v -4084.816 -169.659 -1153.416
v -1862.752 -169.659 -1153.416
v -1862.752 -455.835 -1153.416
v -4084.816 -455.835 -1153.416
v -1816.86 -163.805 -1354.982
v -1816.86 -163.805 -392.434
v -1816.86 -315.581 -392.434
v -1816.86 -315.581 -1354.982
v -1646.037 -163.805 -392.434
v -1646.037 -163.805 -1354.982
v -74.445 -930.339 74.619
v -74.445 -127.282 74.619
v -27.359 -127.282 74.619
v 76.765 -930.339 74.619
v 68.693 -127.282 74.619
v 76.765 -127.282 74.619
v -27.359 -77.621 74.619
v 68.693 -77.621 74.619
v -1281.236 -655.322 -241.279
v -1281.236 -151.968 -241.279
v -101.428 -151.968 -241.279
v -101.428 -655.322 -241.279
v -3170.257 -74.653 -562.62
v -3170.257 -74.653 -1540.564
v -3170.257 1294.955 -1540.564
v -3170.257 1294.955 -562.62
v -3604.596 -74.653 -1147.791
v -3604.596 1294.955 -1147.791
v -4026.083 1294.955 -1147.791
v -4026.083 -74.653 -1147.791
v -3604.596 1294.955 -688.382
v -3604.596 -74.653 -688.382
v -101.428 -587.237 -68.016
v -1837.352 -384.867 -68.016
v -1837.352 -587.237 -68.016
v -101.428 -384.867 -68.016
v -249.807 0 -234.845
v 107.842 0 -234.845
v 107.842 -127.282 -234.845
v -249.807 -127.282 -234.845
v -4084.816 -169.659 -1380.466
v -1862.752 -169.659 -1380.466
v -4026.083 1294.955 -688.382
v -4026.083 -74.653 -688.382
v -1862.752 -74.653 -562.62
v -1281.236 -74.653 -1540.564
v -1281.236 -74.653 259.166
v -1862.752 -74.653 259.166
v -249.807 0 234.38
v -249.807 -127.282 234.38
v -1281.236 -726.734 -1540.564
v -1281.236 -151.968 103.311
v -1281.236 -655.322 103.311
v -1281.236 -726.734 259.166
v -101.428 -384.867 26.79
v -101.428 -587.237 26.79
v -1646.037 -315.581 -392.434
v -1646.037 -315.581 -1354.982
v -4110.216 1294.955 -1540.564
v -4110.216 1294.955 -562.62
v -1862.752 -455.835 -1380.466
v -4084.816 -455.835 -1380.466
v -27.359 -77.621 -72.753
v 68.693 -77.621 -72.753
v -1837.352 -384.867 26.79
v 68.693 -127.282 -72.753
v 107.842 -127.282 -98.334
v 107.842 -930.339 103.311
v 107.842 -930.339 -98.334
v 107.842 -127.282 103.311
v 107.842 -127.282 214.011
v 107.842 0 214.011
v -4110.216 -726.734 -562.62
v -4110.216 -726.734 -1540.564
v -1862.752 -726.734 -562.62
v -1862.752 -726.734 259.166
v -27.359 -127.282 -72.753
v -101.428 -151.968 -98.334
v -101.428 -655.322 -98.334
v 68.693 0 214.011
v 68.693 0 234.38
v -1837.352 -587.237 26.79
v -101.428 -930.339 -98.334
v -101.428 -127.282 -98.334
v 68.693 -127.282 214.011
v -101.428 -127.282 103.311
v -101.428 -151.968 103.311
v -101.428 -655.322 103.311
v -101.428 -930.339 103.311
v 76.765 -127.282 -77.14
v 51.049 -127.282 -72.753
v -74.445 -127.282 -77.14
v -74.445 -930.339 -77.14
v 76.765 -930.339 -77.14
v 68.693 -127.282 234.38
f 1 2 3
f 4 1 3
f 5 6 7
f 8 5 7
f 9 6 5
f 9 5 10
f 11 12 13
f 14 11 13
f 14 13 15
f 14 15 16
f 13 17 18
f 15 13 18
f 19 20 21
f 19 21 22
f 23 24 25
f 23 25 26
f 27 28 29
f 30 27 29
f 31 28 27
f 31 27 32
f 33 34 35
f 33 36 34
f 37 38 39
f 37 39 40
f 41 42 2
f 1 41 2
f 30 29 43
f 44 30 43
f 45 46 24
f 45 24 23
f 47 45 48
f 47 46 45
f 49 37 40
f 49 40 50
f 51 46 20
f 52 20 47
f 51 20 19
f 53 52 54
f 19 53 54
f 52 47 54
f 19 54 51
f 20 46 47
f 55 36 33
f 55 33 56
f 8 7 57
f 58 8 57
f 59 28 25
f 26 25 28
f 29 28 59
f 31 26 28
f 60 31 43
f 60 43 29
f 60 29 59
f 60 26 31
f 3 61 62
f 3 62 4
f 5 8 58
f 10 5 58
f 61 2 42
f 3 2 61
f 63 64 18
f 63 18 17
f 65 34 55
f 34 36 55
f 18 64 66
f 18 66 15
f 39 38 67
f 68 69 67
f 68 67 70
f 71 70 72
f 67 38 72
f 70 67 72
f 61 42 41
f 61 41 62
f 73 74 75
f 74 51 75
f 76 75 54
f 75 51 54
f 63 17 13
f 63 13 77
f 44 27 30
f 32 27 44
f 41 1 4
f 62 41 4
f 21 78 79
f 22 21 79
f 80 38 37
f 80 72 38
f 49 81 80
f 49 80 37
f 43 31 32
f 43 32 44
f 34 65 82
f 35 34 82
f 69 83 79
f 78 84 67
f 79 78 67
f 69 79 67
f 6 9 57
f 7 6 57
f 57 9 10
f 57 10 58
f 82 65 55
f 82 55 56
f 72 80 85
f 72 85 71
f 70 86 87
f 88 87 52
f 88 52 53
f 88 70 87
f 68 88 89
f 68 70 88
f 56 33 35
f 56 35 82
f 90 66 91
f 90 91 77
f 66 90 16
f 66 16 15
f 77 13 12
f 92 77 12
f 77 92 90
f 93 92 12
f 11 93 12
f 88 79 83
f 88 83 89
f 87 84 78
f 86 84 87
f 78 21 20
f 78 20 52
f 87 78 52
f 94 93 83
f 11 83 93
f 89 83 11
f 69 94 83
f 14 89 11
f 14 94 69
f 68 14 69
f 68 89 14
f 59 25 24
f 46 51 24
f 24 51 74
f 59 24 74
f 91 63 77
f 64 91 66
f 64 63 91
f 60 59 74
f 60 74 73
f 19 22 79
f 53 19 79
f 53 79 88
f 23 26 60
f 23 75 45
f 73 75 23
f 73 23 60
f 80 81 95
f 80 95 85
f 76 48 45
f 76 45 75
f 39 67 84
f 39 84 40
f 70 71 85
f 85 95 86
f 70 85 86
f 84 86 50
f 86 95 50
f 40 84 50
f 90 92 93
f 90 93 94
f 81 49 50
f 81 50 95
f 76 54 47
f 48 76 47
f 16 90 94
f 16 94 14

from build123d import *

# Parameters (mm, degrees)
F0_W      = 209.269605577
F0_H      = 201.645091176
F0_W_2    = 151.2103900313
F0_H_2    = 151.7591774464
F1_DEPTH  = 930.3391575813
F2_W      = 0.2076402307
F2_H      = 120.5585766584
F2_W_2    = 134.993257001
F2_H_2    = 81.0865145177
F3_DEPTH  = 77.6207819581
F4_W      = 17.644263804
F4_H      = 139.3913254142
F4_H_2    = 162.0914302766
F5_DEPTH  = 127.2815465927
F6_W      = 503.354460001
F6_H      = 344.5896953344
F6_W_2    = 202.3705542088
F6_H_2    = 94.8067847639
F7_DEPTH  = 1179.8084974289
F8_W      = 652.0807296038
F8_H      = 651.5993475914
F8_W_2    = 202.3705542088
F8_H_2    = 94.8067847639
F9_DEPTH  = 556.1156272888
F10_W     = 139.4962072372
F10_H     = 279.7787887976
F10_H_2   = 371.8205587938
F11_DEPTH = 25.4
F12_W     = 581.5156272888
F12_H     = 652.0807296038
F12_W_2   = 170.8229780197
F12_H_2   = 151.7756134272
F13_DEPTH = 962.5483155251
F14_W     = 581.5156272888
F14_H     = 652.0807296038
F15_DEPTH = 185.5821758509
F16_W     = 652.0807296038
F16_H     = 977.9443591833
F16_W_2   = 286.1760705709
F16_H_2   = 227.0501852036
F17_DEPTH = 2222.0644950867
F18_W     = 652.0807296038
F18_H     = 977.9443591833
F19_DEPTH = 25.4
F20_W     = 939.9594037414
F20_H     = 977.9443591833
F20_W_2   = 421.4870929718
F20_H_2   = 459.4081640244
F21_DEPTH = 1369.6082830429


with BuildPart() as f1:
    # F0 (on Front) → F1 (new body)
    with BuildSketch(Plane.XZ):
        with Locations((3.2069273293, 2.4884268641)):
            Rectangle(F0_W, F0_H)
        with Locations((1.1598430574, -1.2602582574)):
            Rectangle(F0_W_2, F0_H_2, mode=Mode.SUBTRACT)
    extrude(amount=F1_DEPTH)

    # F2 (on face) → F3 (join)
    with BuildSketch(Plane(origin=(0, 0, 0), x_dir=(-1, 0, 0), z_dir=(0, 1, 0))):
        with Locations((-107.7379100025, 43.031684123)):
            Rectangle(F2_W, F2_H)
        Polygon((-107.6340898871, 126.5658885241), (-107.6340898871, 103.3109724522), (27.3591671139, 103.3109724522), (101.4278754592, 103.3109724522), (101.4278754592, -98.3341187239), (27.3591671139, -98.3341187239), (-107.6340898871, -98.3341187239), (-107.6340898871, -121.4749068022), (121.2418451905, -121.4749068022), (121.2418451905, 126.5658885241), align=None)
        with Locations((-40.1374613866, 43.031684123)):
            Rectangle(F2_W_2, F2_H)
        with Locations((-107.7379100025, -57.790861465)):
            Rectangle(F2_W, F2_H_2)
        with Locations((-40.1374613866, -57.790861465)):
            Rectangle(F2_W_2, F2_H_2)
    extrude(amount=-F3_DEPTH)

    # F4 (on face) → F5 (join)
    with BuildSketch(Plane(origin=(0, 0, 0), x_dir=(-1, 0, 0), z_dir=(0, 1, 0))):
        Polygon((-51.0488376021, 74.6193304658), (27.3591671139, 74.6193304658), (27.3591671139, -72.753354907), (-51.0488376021, -72.753354907), (-51.0488376021, -234.8447851837), (249.8074322939, -234.8447851837), (249.8074322939, 234.3800067902), (-68.6931014061, 234.3800067902), (-68.6931014061, 214.01065588), (-51.0488376021, 214.01065588), align=None)
        with Locations((-59.8709695041, 144.3149931729)):
            Rectangle(F4_W, F4_H)
        Polygon((-68.6931014061, -72.753354907), (-68.6931014061, 74.6193304658), (-68.6931014061, 214.01065588), (-107.8417301178, 214.01065588), (-107.8417301178, -234.8447851837), (-68.6931014061, -234.8447851837), align=None)
        with Locations((-59.8709695041, -153.7990700454)):
            Rectangle(F4_W, F4_H_2)
    extrude(amount=-F5_DEPTH)

    # F6 (on face) → F7 (join)
    with BuildSketch(Plane(origin=(-101.4278754592, 0, 0), x_dir=(0, -1, 0), z_dir=(-1, 0, 0))):
        with Locations((403.644785285, -68.9838752151)):
            Rectangle(F6_W, F6_H)
        with Locations((486.0520809889, -20.6129951403)):
            Rectangle(F6_W_2, F6_H_2, mode=Mode.SUBTRACT)
    extrude(amount=F7_DEPTH)

    # F8 (on face) → F9 (join)
    with BuildSketch(Plane(origin=(-1281.2363728881, 0, 0), x_dir=(0, -1, 0), z_dir=(-1, 0, 0))):
        with Locations((400.6932005286, -66.6338801384)):
            Rectangle(F8_W, F8_H)
        with Locations((486.0520809889, -20.6129951403)):
            Rectangle(F8_W_2, F8_H_2, mode=Mode.SUBTRACT)
    extrude(amount=F9_DEPTH)

    # F10 (on face) → F11 (join)
    with BuildSketch(Plane(origin=(-1837.3520001769, 0, 0), x_dir=(0, -1, 0), z_dir=(-1, 0, 0))):
        with Locations((656.9854617119, 119.2763992585)):
            Rectangle(F10_W, F10_H)
        Polygon((587.2373580933, -392.4335539341), (587.2373580933, -20.6129951403), (587.2373580933, 259.1657936573), (74.6528357267, 259.1657936573), (74.6528357267, -392.4335539341), align=None)
        with Locations((656.9854617119, -206.5232745372)):
            Rectangle(F10_W, F10_H_2)
    extrude(amount=F11_DEPTH)

    # F12 (on face) → F13 (join)
    with BuildSketch(Plane(origin=(0, 0, -392.4335539341), x_dir=(1, 0, 0), z_dir=(0, 0, -1))):
        with Locations((-1571.9941865325, 400.6932005286)):
            Rectangle(F12_W, F12_H)
        with Locations((-1731.448829174, 239.6930977702)):
            Rectangle(F12_W_2, F12_H_2, mode=Mode.SUBTRACT)
    extrude(amount=F13_DEPTH)

    # F14 (on face) → F15 (join)
    with BuildSketch(Plane(origin=(0, 0, -1354.9818694592), x_dir=(1, 0, 0), z_dir=(0, 0, -1))):
        with Locations((-1571.9941865325, 400.6932005286)):
            Rectangle(F14_W, F14_H)
    extrude(amount=F15_DEPTH)

    # F16 (on face) → F17 (join)
    with BuildSketch(Plane(origin=(-1862.7520001769, 0, 0), x_dir=(0, -1, 0), z_dir=(-1, 0, 0))):
        with Locations((400.6932005286, -1051.5918657184)):
            Rectangle(F16_W, F16_H)
        with Locations((312.7471879125, -1266.9408917427)):
            Rectangle(F16_W_2, F16_H_2, mode=Mode.SUBTRACT)
    extrude(amount=F17_DEPTH)

    # F18 (on face) → F19 (join)
    with BuildSketch(Plane(origin=(-4084.8164952636, 0, 0), x_dir=(0, -1, 0), z_dir=(-1, 0, 0))):
        with Locations((400.6932005286, -1051.5918657184)):
            Rectangle(F18_W, F18_H)
    extrude(amount=F19_DEPTH)

    # F20 (on face) → F21 (join)
    with BuildSketch(Plane(origin=(0, -74.6528357267, 0), x_dir=(-1, 0, 0), z_dir=(0, 1, 0))):
        with Locations((3640.2367933929, -1051.5918657184)):
            Rectangle(F20_W, F20_H)
        with Locations((3815.339922905, -918.0864691734)):
            Rectangle(F20_W_2, F20_H_2, mode=Mode.SUBTRACT)
    extrude(amount=F21_DEPTH)


solid = f1.part
